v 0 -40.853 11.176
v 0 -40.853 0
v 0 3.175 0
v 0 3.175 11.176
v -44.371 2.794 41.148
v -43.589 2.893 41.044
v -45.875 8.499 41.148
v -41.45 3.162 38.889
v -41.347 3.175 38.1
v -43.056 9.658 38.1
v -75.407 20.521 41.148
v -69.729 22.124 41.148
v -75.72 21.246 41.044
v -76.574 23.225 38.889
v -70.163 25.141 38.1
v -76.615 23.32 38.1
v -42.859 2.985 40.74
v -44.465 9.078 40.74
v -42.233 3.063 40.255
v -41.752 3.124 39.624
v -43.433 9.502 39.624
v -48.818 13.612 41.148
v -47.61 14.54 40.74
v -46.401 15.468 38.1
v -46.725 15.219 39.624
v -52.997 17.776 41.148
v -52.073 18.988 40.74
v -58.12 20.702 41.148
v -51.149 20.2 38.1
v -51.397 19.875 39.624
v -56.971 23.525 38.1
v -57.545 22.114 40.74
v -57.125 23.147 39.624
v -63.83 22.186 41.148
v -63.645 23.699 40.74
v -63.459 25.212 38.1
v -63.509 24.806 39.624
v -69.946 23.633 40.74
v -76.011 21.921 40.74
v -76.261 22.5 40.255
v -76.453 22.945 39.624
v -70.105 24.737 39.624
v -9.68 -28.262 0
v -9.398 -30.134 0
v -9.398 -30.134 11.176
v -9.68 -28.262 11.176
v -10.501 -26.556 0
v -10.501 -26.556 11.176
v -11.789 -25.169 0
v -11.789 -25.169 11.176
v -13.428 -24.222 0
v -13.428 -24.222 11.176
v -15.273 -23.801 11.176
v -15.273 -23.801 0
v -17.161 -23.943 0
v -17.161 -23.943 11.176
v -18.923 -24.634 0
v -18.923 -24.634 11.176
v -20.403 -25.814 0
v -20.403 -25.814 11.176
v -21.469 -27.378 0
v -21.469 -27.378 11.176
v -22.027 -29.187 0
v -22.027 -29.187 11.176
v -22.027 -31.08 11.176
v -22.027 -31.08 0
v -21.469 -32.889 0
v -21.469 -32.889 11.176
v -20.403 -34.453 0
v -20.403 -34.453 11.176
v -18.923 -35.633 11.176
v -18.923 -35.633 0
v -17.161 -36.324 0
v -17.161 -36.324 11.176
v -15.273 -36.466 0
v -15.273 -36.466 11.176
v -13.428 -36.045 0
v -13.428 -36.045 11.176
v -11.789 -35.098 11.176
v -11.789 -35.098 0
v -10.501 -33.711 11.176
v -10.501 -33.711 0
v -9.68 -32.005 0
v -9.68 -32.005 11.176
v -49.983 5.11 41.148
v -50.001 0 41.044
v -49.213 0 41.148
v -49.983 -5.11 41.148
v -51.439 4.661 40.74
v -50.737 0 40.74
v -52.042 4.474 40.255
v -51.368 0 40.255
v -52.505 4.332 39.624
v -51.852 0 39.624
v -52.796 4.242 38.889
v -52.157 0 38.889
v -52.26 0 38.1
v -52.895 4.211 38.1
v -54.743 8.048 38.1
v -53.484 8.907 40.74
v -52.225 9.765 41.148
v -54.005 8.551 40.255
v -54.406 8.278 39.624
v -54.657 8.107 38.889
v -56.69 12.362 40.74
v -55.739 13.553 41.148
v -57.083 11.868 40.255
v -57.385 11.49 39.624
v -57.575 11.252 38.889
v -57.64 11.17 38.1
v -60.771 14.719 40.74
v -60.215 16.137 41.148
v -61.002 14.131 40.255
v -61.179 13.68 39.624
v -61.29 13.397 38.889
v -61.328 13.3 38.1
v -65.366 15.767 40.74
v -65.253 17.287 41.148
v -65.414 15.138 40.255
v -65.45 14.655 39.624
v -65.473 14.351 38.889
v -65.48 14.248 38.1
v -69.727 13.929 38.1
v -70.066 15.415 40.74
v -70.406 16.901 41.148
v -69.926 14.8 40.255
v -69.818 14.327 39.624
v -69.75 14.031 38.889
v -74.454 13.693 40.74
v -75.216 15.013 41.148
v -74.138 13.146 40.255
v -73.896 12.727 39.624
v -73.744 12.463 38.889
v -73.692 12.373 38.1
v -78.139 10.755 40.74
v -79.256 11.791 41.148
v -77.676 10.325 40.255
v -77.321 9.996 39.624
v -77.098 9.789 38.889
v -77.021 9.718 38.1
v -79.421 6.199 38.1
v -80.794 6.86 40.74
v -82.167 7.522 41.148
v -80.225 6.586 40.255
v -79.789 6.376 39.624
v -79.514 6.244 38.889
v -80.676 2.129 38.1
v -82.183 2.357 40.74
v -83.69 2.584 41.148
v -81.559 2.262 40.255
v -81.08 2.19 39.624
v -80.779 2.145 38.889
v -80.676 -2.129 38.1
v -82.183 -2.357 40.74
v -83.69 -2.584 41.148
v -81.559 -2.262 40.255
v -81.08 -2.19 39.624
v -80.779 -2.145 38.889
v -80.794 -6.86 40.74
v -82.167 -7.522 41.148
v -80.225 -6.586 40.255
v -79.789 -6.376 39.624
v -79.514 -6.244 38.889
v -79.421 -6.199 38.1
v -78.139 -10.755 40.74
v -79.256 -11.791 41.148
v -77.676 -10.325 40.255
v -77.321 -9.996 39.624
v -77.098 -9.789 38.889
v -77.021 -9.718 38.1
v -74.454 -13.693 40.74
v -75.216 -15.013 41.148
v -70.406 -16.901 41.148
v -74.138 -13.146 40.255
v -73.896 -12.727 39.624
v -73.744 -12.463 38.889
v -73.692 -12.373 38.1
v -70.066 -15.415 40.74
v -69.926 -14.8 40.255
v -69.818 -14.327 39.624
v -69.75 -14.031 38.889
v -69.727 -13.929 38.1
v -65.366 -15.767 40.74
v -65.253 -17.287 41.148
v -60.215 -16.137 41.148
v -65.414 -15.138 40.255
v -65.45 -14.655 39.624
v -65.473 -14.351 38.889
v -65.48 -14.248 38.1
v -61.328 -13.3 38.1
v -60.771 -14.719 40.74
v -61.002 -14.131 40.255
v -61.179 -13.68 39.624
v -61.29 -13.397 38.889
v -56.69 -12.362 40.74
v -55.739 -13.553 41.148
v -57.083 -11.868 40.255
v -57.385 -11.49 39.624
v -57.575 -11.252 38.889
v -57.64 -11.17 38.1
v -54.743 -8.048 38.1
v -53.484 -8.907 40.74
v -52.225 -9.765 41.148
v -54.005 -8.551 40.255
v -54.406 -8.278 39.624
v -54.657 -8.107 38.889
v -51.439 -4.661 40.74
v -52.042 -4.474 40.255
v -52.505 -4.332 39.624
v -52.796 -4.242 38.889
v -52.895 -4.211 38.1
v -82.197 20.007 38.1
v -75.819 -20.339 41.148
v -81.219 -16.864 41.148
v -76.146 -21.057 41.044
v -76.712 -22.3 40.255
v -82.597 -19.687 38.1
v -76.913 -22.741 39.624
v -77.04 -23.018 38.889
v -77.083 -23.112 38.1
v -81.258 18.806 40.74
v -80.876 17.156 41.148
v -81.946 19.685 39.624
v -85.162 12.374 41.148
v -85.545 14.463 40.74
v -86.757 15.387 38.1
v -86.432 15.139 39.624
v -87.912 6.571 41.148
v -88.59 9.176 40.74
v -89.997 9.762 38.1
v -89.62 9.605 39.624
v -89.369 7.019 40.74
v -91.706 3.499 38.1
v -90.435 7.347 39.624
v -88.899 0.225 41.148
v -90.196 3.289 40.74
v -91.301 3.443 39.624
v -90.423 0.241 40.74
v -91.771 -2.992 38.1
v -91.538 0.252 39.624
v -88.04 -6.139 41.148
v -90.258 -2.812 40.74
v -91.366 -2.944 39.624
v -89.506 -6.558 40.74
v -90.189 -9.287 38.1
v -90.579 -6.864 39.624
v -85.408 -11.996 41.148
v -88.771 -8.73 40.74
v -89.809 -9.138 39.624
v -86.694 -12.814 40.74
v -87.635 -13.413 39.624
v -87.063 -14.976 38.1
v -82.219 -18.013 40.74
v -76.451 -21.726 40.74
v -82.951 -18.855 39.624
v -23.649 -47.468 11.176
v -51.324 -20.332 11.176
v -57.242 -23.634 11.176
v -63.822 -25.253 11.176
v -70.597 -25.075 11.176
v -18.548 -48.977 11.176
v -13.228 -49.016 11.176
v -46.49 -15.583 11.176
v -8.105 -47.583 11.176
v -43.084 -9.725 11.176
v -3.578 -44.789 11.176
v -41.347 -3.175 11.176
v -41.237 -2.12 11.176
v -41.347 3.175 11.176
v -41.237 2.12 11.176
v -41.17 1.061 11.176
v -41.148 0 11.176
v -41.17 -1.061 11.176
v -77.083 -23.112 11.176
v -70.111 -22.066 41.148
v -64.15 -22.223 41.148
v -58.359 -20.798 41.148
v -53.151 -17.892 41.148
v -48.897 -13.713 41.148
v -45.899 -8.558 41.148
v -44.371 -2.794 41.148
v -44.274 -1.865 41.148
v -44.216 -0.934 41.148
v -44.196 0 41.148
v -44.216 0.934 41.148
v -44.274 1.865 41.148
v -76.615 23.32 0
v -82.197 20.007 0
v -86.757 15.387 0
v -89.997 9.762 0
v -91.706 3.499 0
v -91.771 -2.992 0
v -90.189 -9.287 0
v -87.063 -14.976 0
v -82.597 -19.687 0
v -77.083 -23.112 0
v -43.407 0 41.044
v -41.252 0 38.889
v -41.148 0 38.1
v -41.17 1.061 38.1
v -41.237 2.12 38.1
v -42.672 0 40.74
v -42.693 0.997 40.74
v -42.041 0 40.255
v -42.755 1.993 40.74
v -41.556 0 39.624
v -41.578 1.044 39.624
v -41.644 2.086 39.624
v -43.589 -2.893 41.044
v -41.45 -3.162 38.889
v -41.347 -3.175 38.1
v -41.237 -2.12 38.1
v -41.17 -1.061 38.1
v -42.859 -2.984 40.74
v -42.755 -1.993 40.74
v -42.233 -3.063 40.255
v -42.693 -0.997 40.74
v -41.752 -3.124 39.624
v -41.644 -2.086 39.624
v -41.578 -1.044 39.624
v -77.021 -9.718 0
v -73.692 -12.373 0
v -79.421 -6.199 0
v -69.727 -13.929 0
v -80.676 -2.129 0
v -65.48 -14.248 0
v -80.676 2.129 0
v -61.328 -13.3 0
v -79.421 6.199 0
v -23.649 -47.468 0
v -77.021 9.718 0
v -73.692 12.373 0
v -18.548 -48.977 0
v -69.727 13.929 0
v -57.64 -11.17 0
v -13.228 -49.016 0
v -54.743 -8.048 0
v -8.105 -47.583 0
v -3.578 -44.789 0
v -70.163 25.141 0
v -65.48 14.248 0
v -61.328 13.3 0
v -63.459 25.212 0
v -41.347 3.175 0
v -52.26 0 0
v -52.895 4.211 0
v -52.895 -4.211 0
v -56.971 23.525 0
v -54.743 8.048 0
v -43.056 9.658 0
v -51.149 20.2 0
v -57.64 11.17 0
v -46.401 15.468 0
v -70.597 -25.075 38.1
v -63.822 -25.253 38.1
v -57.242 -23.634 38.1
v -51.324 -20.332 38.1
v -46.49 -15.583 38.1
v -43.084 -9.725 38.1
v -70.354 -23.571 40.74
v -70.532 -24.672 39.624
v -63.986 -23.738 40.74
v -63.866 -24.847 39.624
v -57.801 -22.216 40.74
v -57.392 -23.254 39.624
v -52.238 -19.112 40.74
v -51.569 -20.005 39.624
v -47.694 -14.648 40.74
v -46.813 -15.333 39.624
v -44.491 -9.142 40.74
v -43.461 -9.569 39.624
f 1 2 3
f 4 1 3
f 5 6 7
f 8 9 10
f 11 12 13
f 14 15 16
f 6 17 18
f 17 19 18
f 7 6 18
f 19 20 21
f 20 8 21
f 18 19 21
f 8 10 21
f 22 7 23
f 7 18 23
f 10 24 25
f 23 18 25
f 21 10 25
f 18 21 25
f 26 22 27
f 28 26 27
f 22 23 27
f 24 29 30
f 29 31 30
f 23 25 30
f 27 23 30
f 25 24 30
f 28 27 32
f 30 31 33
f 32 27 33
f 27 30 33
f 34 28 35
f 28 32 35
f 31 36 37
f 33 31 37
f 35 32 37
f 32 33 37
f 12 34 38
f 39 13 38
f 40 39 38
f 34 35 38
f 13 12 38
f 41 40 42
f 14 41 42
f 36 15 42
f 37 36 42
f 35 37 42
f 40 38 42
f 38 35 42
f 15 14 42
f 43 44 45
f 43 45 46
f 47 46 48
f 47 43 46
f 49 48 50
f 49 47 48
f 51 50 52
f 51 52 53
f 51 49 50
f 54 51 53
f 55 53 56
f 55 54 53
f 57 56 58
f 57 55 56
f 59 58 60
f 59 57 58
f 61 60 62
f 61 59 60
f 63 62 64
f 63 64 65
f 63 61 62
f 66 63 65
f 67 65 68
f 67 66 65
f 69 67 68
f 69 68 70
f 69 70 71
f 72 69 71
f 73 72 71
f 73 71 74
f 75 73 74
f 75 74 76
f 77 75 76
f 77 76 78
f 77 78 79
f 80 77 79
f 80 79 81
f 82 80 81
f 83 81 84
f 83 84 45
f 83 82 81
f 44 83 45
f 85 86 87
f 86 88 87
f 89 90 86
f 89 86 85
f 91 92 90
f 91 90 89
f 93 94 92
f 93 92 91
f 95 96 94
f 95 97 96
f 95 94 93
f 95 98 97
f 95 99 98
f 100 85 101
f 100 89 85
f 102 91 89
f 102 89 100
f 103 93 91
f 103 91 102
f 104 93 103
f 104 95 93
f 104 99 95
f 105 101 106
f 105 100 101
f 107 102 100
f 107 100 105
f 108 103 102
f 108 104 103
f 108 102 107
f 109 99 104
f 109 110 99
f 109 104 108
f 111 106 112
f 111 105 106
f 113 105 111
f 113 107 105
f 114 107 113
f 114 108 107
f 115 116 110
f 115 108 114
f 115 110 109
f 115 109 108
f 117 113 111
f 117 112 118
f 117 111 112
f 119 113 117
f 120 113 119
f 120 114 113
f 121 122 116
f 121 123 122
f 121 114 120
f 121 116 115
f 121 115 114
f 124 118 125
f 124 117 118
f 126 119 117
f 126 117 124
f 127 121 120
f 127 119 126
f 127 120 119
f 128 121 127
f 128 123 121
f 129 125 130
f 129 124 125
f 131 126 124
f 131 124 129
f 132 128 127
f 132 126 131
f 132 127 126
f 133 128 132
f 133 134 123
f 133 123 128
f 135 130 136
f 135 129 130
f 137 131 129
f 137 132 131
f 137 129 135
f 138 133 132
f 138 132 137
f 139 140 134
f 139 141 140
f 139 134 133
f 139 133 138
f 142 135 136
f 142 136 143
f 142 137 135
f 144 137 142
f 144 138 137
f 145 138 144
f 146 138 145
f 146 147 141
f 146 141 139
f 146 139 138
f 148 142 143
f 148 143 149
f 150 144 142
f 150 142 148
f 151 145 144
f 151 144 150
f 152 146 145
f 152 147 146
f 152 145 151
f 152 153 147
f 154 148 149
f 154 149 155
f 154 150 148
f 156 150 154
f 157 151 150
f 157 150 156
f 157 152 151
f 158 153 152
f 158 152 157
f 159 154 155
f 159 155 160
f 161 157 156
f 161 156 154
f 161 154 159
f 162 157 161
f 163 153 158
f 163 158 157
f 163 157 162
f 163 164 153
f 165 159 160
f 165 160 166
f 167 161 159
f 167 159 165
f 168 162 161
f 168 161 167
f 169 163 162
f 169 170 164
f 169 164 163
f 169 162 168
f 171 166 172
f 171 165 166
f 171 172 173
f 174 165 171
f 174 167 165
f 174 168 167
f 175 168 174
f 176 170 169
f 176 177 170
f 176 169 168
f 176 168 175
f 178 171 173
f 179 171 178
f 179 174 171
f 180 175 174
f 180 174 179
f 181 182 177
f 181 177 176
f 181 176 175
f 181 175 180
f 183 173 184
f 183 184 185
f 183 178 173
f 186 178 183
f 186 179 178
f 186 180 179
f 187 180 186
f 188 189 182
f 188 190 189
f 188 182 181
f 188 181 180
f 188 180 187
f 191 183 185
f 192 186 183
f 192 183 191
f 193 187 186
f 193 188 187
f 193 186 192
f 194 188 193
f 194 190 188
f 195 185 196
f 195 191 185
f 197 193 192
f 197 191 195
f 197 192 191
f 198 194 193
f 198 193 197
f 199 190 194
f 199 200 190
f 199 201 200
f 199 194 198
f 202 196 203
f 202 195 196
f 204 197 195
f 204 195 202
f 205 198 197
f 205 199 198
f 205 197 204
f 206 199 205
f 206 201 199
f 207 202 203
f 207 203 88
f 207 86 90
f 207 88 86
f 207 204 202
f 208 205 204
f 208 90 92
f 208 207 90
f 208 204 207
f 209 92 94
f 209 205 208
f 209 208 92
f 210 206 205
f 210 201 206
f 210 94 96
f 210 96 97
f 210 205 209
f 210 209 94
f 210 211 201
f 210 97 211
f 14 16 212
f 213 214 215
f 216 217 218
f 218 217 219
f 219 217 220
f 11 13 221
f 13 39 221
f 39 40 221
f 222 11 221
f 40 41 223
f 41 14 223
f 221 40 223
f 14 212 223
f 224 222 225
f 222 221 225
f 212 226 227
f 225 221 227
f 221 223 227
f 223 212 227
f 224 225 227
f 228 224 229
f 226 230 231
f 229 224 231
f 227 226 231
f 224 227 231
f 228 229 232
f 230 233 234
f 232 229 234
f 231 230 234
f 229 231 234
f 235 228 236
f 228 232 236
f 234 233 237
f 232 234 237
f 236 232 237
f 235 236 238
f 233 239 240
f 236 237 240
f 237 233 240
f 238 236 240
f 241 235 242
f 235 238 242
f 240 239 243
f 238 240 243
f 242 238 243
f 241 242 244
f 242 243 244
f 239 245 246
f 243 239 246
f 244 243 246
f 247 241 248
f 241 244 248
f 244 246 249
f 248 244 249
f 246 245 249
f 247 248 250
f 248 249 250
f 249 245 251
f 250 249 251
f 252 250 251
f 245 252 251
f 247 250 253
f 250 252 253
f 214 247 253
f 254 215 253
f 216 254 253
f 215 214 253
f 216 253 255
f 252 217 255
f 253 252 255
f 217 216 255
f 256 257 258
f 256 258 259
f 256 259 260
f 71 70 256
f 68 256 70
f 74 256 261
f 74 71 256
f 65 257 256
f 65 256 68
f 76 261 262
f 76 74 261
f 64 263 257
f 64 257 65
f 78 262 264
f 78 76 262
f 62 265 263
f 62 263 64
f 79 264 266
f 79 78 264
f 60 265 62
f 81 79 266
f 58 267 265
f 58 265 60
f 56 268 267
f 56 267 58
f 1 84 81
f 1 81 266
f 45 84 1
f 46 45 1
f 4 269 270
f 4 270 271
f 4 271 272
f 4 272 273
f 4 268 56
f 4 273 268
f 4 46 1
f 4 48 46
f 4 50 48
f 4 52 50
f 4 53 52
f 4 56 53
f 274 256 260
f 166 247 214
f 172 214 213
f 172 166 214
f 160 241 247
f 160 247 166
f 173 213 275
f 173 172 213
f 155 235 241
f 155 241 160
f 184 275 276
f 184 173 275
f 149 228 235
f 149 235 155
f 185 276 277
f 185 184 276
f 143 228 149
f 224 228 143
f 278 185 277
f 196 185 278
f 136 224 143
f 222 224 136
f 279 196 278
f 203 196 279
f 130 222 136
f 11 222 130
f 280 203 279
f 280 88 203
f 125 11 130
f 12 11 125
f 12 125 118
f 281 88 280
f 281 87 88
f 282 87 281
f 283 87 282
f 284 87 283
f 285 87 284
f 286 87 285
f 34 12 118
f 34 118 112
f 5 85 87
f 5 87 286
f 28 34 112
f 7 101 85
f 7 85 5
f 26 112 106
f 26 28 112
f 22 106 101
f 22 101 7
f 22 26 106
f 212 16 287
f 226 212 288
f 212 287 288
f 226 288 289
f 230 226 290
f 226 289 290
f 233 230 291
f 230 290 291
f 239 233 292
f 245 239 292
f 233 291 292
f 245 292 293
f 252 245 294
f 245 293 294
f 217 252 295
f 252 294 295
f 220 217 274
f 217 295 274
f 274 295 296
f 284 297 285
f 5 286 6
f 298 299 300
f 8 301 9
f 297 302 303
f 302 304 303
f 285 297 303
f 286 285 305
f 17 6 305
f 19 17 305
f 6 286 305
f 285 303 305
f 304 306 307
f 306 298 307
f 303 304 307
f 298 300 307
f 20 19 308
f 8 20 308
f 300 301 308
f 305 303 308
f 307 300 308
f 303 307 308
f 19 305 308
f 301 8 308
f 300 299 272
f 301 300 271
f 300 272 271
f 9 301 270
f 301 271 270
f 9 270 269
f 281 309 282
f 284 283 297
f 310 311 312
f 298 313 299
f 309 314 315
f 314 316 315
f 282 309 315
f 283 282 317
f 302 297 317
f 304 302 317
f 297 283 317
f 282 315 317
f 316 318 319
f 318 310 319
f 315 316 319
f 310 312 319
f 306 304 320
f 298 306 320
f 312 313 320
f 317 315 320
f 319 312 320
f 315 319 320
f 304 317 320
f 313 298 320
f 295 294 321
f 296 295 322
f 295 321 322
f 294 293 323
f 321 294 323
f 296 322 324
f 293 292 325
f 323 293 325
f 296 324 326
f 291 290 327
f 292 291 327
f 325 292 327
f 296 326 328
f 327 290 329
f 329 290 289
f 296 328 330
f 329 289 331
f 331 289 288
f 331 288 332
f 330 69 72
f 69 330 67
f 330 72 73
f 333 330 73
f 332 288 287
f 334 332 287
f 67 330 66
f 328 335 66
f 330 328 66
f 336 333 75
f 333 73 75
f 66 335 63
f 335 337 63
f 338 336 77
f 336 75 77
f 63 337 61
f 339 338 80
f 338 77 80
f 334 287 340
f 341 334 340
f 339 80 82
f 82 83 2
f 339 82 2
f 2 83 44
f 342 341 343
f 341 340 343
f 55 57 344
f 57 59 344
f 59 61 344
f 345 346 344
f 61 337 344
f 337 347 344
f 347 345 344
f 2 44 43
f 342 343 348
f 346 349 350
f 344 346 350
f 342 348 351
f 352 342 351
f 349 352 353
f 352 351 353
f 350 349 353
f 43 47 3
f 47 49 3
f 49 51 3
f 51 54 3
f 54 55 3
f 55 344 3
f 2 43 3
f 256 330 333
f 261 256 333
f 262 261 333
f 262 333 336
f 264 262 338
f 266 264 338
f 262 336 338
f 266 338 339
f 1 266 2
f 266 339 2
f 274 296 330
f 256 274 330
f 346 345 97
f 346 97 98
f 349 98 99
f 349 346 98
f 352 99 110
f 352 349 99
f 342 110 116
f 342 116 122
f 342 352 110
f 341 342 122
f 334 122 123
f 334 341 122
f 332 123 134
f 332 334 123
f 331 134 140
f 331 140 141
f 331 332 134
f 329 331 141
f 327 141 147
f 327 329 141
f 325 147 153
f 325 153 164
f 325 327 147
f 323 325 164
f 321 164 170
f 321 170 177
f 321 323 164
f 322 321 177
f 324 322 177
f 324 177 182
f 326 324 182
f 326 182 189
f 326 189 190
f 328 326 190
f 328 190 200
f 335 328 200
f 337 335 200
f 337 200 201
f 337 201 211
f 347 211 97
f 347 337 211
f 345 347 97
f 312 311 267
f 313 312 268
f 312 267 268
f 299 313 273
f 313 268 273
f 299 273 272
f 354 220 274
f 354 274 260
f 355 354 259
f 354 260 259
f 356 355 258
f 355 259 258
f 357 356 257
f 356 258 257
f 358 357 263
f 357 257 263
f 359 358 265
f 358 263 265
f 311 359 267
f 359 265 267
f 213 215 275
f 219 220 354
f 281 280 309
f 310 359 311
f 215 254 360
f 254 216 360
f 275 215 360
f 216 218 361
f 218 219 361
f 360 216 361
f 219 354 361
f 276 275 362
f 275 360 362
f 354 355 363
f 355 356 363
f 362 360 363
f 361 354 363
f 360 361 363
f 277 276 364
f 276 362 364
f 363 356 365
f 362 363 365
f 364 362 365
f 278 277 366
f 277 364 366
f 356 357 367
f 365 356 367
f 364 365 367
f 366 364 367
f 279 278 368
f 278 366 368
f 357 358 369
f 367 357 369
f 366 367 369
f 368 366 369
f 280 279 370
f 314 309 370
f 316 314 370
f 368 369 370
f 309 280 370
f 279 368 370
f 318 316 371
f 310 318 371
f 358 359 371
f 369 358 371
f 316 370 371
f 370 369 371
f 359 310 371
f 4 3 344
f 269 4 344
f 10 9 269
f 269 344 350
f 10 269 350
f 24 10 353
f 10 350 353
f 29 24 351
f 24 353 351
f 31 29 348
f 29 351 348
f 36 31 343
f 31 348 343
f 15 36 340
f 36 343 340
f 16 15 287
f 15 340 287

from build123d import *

# Parameters (mm, degrees)
F0_R     = 6.35
F1_DEPTH = 11.176
F0_R_2   = 16.256
F0_R_3   = 14.2875
F2_DEPTH = 41.148
F3_R     = 3.048
F4_R     = 3.048


with BuildPart() as f1:
    # F0 (on Top) → F1 (new body)
    with BuildSketch(Plane.XY):
        with BuildLine():
            ThreePointArc((-41.3472187621, 3.175), (-41.1978536154, 1.5906219786), (-41.148, 0))
            ThreePointArc((-41.148, 0), (-41.1978536154, -1.5906219786), (-41.3472187621, -3.175))
            Line((-41.3472187621, -3.175), (0, -3.175))
            Line((0, -3.175), (0, 0))
            Line((0, 0), (0, 3.175))
            Line((0, 3.175), (-41.3472187621, 3.175))
        make_face()
        with BuildLine():
            Line((0, -3.175), (-41.3472187621, -3.175))
            ThreePointArc((-41.3472187621, -3.175), (-54.1727312933, -22.1813598419), (-77.0827467531, -23.1123151339))
            Line((-77.0827467531, -23.1123151339), (-23.6490600649, -47.4677444402))
            ThreePointArc((-23.6490600649, -47.4677444402), (-10.6164287508, -48.4793380387), (0, -40.8527895955))
            Line((0, -40.8527895955), (0, -3.175))
        make_face()
        with Locations((-15.748, -30.1335080897)):
            Circle(F0_R, mode=Mode.SUBTRACT)
    extrude(amount=F1_DEPTH)

    # F0 (on Top) → F2 (join)
    with BuildSketch(Plane.XY):
        with BuildLine():
            ThreePointArc((-41.3472187621, -3.175), (-41.1978536154, -1.5906219786), (-41.148, 0))
            ThreePointArc((-41.148, 0), (-41.1978536154, 1.5906219786), (-41.3472187621, 3.175))
            ThreePointArc((-41.3472187621, 3.175), (-53.9498972239, 22.0555618029), (-76.6149503625, 23.3198737218))
            ThreePointArc((-76.6149503625, 23.3198737218), (-91.9467110203, 0.2558876856), (-77.0827467531, -23.1123151339))
            ThreePointArc((-77.0827467531, -23.1123151339), (-54.1727312933, -22.1813598419), (-41.3472187621, -3.175))
        make_face()
        with Locations((-66.548, 0)):
            Circle(F0_R_2, mode=Mode.SUBTRACT)
        with Locations((-66.548, 0)):
            Circle(F0_R_2)
        with Locations((-66.548, 0)):
            Circle(F0_R_3, mode=Mode.SUBTRACT)
    extrude(amount=F2_DEPTH)

    # F3
    f3_edges = [f1.edges().sort_by_distance(p)[0] for p in [
        (-91.748781, 3.175, 41.148),
    ]]
    fillet(f3_edges, radius=F3_R)

    # F4
    f4_edges = [f1.edges().sort_by_distance(p)[0] for p in [
        (-80.8355, 0, 41.148),
    ]]
    fillet(f4_edges, radius=F4_R)


solid = f1.part
